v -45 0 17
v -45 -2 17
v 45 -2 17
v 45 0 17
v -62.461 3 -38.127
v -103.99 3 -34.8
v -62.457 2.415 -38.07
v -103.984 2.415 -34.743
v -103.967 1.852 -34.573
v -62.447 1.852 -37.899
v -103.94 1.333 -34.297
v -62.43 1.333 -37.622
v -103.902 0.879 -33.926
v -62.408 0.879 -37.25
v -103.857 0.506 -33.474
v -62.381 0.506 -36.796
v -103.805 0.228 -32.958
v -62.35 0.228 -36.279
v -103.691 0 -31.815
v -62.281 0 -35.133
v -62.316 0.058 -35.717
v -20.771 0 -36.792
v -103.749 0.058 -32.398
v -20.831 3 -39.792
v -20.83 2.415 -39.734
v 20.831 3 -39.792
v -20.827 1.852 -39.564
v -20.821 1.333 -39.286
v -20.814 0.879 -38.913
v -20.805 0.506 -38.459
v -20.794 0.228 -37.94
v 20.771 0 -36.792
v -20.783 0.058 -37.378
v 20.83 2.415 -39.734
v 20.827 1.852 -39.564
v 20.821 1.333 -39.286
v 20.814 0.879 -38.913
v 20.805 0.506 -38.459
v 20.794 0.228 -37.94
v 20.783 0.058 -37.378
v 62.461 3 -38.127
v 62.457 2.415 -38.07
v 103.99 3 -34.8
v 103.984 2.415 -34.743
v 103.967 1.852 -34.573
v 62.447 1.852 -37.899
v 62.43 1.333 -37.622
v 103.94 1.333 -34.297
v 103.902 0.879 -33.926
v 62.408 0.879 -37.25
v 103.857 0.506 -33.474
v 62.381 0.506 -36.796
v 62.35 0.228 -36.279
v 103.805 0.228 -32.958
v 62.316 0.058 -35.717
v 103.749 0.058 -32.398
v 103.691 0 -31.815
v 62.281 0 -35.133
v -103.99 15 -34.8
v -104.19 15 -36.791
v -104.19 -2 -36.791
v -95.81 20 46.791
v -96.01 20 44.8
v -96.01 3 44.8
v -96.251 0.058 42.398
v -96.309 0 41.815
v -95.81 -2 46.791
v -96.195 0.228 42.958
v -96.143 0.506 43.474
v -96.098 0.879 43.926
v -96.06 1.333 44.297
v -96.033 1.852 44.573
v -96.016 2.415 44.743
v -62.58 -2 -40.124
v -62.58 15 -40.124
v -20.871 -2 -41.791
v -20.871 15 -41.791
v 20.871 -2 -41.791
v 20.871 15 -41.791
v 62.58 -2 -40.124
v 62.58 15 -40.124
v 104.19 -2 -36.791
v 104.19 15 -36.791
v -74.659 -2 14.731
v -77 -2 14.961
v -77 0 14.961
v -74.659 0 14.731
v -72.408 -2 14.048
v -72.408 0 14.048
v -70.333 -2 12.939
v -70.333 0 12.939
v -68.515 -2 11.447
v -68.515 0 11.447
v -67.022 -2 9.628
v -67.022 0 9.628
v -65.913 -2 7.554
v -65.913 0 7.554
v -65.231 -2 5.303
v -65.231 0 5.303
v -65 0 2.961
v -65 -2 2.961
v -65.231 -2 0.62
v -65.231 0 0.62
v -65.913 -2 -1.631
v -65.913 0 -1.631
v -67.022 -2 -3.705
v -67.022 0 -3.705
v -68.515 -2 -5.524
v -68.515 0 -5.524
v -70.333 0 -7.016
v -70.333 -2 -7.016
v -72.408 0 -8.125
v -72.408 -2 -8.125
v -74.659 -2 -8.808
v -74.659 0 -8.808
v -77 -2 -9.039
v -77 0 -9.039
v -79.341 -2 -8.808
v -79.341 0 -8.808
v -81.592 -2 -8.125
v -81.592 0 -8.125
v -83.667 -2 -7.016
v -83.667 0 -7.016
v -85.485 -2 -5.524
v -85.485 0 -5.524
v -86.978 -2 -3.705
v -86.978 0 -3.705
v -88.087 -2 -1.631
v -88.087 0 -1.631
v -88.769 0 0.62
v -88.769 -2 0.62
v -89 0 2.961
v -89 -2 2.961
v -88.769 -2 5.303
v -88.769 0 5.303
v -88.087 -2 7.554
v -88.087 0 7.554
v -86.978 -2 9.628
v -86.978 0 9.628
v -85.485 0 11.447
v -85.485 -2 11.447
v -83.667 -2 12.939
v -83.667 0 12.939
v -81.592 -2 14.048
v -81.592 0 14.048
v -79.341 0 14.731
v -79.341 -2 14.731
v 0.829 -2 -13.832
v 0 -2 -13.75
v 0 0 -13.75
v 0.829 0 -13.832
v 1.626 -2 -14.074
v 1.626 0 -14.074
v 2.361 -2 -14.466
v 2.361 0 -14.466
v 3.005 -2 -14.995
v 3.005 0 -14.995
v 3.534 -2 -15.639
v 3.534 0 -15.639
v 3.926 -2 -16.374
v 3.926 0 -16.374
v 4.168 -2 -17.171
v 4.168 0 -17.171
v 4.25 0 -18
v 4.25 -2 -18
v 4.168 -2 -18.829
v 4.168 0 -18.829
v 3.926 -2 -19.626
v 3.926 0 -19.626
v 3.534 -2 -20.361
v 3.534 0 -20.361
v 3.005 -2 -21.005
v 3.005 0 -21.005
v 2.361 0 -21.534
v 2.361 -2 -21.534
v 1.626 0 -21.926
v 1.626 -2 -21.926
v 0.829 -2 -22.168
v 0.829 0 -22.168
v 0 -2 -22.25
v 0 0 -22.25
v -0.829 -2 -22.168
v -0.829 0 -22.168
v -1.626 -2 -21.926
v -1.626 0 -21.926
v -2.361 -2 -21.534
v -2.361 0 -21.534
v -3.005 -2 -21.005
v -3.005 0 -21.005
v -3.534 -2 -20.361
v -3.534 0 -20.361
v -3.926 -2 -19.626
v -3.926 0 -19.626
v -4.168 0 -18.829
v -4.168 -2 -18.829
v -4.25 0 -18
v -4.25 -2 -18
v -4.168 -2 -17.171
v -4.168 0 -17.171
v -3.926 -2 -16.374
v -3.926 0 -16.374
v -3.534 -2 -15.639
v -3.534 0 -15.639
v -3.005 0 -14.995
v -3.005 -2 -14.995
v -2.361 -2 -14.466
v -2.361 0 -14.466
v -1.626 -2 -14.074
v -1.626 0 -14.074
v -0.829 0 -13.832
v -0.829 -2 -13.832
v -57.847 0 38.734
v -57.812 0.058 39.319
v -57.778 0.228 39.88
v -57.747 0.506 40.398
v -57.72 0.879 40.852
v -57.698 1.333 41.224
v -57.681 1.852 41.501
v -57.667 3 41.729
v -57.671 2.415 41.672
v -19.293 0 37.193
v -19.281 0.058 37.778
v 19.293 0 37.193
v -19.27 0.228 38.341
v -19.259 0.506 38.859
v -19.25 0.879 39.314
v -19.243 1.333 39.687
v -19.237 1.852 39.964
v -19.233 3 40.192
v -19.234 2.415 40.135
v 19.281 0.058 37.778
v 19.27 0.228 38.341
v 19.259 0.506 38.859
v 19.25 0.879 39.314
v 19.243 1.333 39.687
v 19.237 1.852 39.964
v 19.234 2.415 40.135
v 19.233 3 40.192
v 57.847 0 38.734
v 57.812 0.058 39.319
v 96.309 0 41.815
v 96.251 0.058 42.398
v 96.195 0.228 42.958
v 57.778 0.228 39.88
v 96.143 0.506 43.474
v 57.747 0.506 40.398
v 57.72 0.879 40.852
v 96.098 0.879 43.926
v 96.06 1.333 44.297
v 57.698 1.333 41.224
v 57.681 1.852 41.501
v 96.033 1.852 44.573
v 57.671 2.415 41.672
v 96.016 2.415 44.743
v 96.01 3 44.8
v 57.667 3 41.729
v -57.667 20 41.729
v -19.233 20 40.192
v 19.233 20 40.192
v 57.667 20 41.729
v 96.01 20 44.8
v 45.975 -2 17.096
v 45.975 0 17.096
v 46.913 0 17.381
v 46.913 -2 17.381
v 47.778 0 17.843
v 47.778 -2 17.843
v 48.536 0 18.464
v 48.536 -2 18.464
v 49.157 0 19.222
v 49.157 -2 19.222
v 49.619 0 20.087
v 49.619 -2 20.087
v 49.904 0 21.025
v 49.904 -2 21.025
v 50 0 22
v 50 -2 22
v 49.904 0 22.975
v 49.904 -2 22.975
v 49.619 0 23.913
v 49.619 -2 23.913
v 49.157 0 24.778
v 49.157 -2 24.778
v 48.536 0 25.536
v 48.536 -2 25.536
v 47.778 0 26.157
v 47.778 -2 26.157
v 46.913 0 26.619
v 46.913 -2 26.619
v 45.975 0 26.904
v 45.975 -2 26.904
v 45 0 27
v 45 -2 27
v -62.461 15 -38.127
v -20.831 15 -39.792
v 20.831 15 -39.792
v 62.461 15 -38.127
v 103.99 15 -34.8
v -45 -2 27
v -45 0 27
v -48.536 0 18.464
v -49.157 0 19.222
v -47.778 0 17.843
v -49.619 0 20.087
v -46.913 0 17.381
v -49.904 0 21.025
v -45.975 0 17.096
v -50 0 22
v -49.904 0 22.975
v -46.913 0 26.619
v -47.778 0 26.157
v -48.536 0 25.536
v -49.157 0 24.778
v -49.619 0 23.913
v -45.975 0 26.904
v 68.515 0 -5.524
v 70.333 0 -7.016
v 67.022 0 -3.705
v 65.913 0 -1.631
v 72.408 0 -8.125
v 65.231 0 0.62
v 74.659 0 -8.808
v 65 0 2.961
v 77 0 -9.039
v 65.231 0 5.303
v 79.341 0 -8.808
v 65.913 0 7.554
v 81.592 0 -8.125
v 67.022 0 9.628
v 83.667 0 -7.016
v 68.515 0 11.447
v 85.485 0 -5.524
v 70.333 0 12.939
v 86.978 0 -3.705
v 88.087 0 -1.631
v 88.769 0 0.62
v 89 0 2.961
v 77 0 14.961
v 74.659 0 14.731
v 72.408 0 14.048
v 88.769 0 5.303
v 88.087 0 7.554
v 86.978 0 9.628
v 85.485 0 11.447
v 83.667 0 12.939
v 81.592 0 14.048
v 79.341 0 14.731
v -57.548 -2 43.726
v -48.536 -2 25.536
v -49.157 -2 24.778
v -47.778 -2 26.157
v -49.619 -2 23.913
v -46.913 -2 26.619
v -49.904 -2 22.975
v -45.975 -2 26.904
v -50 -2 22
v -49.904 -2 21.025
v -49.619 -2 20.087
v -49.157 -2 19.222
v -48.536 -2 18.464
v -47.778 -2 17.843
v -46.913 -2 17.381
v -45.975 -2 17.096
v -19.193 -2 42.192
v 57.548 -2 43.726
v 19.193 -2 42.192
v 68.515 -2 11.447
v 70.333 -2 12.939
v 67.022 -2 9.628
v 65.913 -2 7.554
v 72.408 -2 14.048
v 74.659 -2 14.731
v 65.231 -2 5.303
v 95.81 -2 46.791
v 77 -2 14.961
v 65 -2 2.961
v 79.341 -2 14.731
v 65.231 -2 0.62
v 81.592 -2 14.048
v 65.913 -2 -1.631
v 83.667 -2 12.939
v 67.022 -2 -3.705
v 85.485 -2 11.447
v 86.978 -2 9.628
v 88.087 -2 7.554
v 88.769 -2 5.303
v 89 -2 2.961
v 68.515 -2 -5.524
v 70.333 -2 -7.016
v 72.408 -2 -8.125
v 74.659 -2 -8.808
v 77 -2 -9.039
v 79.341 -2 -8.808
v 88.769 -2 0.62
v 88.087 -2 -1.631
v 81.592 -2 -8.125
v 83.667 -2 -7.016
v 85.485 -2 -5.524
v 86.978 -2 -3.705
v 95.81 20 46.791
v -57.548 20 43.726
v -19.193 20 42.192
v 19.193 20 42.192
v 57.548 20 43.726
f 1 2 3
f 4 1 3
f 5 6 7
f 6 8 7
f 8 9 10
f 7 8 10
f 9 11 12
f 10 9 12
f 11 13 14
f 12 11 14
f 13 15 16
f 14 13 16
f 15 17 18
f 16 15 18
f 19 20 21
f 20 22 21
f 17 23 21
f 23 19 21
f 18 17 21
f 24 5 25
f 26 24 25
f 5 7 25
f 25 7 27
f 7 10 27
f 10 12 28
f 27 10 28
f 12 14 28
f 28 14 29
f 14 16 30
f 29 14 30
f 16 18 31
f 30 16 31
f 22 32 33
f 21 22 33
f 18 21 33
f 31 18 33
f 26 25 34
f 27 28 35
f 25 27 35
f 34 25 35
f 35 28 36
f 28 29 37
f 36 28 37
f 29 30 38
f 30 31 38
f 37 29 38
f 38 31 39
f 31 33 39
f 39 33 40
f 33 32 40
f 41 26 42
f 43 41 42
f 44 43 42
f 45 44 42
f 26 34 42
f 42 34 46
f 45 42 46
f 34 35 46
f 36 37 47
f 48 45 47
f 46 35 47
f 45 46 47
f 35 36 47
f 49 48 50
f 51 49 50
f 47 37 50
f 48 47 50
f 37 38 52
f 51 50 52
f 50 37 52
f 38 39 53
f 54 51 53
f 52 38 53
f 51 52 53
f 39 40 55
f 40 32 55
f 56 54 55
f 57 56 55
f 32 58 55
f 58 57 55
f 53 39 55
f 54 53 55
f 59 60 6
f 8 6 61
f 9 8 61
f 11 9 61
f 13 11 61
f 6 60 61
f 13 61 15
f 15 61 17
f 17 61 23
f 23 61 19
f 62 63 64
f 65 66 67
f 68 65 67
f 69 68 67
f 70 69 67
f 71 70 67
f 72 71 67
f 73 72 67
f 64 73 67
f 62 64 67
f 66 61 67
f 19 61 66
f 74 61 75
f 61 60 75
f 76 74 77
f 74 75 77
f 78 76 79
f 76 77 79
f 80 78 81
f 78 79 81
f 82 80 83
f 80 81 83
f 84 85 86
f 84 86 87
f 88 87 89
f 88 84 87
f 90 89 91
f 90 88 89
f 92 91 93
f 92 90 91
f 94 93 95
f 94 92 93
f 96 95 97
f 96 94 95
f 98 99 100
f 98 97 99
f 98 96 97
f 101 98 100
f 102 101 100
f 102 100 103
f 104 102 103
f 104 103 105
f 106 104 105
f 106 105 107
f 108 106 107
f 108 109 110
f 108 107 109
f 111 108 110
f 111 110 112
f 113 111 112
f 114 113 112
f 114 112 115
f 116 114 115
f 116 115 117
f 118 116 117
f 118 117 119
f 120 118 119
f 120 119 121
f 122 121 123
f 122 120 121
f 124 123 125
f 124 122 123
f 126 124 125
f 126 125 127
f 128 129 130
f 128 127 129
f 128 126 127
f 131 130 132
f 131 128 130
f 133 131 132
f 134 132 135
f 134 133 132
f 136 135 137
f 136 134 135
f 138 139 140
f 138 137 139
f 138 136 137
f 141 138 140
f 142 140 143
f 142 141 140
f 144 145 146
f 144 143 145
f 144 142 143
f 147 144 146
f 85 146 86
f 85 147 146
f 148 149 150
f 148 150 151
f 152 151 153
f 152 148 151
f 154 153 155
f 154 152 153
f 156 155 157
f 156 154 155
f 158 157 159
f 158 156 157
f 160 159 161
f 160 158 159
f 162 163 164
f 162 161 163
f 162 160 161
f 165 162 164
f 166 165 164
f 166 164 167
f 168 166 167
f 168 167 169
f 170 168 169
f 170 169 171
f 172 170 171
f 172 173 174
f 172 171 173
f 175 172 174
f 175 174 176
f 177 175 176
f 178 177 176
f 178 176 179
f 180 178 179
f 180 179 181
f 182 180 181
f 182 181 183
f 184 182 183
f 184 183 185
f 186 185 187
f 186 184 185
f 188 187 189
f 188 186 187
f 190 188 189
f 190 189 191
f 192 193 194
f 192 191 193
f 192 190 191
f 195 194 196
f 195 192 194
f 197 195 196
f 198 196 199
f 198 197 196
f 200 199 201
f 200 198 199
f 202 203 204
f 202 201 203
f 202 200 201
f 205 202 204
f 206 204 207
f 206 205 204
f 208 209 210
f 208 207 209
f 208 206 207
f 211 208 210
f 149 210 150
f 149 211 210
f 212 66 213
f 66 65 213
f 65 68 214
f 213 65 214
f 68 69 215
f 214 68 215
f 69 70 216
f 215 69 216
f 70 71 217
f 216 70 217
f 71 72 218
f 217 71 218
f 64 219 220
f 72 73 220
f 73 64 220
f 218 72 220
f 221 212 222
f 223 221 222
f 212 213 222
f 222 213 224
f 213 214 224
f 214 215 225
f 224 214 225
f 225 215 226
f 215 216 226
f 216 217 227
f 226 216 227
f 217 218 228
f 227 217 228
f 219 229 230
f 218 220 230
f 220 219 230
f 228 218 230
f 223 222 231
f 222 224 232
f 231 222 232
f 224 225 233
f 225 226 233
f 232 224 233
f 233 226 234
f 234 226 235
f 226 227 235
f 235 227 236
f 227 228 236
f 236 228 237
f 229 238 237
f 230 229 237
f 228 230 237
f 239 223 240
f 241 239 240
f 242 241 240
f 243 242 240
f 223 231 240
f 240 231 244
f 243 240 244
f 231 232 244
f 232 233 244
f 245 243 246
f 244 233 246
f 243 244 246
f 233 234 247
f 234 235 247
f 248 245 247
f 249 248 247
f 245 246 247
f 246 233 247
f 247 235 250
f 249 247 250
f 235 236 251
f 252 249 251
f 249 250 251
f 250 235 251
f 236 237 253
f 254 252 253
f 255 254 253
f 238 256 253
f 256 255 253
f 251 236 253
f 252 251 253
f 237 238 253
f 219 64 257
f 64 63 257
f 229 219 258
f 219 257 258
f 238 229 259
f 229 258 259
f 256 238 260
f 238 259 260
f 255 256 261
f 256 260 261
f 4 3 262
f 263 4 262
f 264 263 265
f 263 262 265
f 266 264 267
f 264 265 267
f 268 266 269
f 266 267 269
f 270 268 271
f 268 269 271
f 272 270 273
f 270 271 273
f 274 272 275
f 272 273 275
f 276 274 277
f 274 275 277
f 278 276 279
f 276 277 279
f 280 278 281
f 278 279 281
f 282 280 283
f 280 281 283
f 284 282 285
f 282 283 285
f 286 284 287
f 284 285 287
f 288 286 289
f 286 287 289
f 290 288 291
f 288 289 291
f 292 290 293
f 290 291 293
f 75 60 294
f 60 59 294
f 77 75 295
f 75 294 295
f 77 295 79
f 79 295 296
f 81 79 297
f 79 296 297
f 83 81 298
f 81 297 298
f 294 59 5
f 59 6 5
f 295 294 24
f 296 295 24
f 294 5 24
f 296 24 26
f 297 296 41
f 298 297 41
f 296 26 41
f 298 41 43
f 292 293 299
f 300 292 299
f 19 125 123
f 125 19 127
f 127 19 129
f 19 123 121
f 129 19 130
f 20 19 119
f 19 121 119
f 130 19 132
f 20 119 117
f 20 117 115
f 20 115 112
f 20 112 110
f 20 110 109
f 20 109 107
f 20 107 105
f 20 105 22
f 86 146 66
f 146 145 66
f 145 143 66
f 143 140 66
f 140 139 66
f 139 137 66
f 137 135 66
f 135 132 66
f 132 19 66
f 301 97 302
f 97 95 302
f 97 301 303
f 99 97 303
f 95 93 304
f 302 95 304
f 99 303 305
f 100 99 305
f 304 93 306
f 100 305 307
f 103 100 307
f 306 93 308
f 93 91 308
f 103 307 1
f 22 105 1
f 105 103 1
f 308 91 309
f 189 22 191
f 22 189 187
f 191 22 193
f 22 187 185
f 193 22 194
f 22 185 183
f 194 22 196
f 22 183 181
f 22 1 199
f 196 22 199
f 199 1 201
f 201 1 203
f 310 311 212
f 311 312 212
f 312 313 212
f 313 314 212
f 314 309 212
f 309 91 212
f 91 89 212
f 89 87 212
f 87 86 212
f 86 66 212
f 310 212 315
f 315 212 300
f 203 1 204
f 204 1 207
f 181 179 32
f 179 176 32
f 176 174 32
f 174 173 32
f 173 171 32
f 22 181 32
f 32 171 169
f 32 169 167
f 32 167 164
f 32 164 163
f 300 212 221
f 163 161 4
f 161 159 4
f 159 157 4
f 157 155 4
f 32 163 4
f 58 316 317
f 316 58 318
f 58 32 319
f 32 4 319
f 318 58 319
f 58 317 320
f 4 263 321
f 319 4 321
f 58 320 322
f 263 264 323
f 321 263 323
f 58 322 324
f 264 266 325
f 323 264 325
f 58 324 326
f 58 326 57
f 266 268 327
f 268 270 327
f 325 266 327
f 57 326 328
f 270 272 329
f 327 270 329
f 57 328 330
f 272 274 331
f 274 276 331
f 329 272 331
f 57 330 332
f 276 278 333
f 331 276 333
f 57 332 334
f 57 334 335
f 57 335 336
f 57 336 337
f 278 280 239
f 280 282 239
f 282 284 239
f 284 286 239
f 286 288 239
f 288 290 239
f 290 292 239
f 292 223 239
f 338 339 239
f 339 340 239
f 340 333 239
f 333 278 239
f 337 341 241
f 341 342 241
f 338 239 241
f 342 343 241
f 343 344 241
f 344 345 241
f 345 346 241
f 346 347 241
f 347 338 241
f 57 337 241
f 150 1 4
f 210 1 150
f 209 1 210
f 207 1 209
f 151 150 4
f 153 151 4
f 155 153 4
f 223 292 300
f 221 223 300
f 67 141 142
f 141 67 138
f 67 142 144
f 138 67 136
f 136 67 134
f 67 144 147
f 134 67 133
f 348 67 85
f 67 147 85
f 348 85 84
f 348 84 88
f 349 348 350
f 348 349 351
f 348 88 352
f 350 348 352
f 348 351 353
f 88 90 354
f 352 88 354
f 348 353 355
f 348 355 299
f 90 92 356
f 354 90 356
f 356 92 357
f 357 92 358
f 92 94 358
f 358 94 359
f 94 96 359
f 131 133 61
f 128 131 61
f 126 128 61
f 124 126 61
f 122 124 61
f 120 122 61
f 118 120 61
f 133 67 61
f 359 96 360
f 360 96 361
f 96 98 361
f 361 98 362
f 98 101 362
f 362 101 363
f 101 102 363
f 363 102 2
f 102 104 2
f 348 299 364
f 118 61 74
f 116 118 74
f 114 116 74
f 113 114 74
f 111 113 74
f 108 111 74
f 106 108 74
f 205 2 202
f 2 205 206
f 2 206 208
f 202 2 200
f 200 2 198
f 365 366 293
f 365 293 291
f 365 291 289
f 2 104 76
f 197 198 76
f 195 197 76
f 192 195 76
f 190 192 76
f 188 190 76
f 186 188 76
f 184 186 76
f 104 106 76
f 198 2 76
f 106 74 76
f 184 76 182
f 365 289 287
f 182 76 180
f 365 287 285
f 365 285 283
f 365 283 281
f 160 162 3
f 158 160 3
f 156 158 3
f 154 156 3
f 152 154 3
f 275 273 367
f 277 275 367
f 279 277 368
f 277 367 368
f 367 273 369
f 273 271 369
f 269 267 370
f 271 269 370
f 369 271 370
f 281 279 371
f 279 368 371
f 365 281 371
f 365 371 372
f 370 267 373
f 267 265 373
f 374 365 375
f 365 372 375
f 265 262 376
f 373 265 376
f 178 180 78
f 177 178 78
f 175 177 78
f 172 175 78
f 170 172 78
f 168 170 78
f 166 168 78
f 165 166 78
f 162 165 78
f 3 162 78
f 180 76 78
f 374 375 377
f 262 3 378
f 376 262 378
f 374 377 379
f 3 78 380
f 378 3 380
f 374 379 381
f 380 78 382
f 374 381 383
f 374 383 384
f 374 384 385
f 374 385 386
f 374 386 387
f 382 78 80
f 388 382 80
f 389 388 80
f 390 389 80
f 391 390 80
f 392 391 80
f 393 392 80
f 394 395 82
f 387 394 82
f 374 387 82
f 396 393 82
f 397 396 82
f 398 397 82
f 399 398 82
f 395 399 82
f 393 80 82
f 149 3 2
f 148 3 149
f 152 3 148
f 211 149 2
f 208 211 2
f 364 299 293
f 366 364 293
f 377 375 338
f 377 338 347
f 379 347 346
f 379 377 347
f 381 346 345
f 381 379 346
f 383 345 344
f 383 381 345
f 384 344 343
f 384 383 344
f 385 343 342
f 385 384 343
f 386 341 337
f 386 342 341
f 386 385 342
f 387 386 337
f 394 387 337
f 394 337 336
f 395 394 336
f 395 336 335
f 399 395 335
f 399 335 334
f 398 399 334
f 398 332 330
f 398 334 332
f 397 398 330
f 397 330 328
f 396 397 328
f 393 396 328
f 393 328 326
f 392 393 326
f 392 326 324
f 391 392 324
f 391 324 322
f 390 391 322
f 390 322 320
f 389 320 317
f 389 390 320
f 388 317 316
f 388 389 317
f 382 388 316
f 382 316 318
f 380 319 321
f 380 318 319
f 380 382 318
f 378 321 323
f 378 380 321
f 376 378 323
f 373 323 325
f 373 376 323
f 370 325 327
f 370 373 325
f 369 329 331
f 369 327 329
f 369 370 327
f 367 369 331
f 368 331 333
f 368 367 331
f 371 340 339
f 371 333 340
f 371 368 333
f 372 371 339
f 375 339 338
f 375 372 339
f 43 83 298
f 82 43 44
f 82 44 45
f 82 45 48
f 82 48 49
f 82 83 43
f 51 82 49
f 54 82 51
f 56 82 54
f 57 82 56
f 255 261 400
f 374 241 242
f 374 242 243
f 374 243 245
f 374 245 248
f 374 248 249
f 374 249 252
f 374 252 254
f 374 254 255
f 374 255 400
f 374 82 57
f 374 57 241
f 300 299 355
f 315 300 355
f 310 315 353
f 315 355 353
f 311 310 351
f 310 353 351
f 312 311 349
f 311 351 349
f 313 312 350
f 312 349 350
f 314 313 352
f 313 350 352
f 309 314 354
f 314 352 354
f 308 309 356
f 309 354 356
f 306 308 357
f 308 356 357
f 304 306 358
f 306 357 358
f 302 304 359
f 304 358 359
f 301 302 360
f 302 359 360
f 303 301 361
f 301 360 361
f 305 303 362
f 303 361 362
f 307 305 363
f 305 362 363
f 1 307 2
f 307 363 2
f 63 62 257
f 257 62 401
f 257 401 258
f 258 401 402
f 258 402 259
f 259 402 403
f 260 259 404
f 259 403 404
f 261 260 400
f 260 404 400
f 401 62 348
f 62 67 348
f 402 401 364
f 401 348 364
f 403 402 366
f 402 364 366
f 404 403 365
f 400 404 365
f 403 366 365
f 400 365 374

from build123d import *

# Parameters (mm, degrees)
MOUNTING_POINTS_DEPTH      = 116.951759253
MOUNTING_POINTS_DEPTH_BACK = 116.951759253
SKETCH3_R                  = 4.25
SKETCH3_R_2                = 12
SLOT_CLEARANCE_DEPTH       = 116.951759253
SLOT_CLEARANCE_DEPTH_BACK  = 116.951759253


with BuildPart() as part:
    # Sweep1: sweep along a path in Sketch1
    with BuildLine(Plane(origin=(0, 0, 0), x_dir=(1, 0, 0), z_dir=(0, 1, 0))) as sweep1_path:
        ThreePointArc((-100, -5), (0, 0), (100, -5))
    # Sketch2 → Sweep1 (sweep)
    with BuildSketch(Plane(origin=(0, 0, 0), x_dir=(0, 0, -1), z_dir=(1, 0, 0))):
        with BuildLine():
            Line((-37, 0), (37, 0))
            ThreePointArc((37, 0), (39.121320344, 0.878679656), (40, 3))
            Line((40, 3), (40, 15))
            Line((40, 15), (42, 15))
            Line((42, 15), (42, -2))
            Line((42, -2), (-42, -2))
            Line((-42, -2), (-42, 20))
            Line((-42, 20), (-40, 20))
            Line((-40, 20), (-40, 3))
            ThreePointArc((-40, 3), (-39.121320344, 0.878679656), (-37, 0))
        make_face()
    sweep(path=sweep1_path.line)

    # Sketch3 → Mounting points (cut, two sides: drawn at the far end of the back side and taken through both)
    with BuildSketch(Plane(origin=(0, 0, 0), x_dir=(1, 0, 0), z_dir=(0, 1, 0)).offset(-MOUNTING_POINTS_DEPTH_BACK)):
        with Locations(Location((0, 18, 0), (0, 0, 270))):
            Circle(SKETCH3_R)
        with Locations(Location((-77, -2.961481483, 0), (0, 0, 270))):
            Circle(SKETCH3_R_2)
        with Locations(Location((77, -2.961481483, 0), (0, 0, 270))):
            Circle(SKETCH3_R_2)
    extrude(amount=MOUNTING_POINTS_DEPTH + MOUNTING_POINTS_DEPTH_BACK, mode=Mode.SUBTRACT)

    # Sketch4 → Slot clearance (cut, two sides: drawn at the far end of the back side and taken through both)
    with BuildSketch(Plane(origin=(0, 0, 0), x_dir=(1, 0, 0), z_dir=(0, 1, 0)).offset(-SLOT_CLEARANCE_DEPTH_BACK)):
        with BuildLine():
            Line((-45, -17), (45, -17))
            ThreePointArc((45, -17), (50, -22), (45, -27))
            Line((45, -27), (-45, -27))
            ThreePointArc((-45, -27), (-50, -22), (-45, -17))
        make_face()
    extrude(amount=SLOT_CLEARANCE_DEPTH + SLOT_CLEARANCE_DEPTH_BACK, mode=Mode.SUBTRACT)


solid = part.part
